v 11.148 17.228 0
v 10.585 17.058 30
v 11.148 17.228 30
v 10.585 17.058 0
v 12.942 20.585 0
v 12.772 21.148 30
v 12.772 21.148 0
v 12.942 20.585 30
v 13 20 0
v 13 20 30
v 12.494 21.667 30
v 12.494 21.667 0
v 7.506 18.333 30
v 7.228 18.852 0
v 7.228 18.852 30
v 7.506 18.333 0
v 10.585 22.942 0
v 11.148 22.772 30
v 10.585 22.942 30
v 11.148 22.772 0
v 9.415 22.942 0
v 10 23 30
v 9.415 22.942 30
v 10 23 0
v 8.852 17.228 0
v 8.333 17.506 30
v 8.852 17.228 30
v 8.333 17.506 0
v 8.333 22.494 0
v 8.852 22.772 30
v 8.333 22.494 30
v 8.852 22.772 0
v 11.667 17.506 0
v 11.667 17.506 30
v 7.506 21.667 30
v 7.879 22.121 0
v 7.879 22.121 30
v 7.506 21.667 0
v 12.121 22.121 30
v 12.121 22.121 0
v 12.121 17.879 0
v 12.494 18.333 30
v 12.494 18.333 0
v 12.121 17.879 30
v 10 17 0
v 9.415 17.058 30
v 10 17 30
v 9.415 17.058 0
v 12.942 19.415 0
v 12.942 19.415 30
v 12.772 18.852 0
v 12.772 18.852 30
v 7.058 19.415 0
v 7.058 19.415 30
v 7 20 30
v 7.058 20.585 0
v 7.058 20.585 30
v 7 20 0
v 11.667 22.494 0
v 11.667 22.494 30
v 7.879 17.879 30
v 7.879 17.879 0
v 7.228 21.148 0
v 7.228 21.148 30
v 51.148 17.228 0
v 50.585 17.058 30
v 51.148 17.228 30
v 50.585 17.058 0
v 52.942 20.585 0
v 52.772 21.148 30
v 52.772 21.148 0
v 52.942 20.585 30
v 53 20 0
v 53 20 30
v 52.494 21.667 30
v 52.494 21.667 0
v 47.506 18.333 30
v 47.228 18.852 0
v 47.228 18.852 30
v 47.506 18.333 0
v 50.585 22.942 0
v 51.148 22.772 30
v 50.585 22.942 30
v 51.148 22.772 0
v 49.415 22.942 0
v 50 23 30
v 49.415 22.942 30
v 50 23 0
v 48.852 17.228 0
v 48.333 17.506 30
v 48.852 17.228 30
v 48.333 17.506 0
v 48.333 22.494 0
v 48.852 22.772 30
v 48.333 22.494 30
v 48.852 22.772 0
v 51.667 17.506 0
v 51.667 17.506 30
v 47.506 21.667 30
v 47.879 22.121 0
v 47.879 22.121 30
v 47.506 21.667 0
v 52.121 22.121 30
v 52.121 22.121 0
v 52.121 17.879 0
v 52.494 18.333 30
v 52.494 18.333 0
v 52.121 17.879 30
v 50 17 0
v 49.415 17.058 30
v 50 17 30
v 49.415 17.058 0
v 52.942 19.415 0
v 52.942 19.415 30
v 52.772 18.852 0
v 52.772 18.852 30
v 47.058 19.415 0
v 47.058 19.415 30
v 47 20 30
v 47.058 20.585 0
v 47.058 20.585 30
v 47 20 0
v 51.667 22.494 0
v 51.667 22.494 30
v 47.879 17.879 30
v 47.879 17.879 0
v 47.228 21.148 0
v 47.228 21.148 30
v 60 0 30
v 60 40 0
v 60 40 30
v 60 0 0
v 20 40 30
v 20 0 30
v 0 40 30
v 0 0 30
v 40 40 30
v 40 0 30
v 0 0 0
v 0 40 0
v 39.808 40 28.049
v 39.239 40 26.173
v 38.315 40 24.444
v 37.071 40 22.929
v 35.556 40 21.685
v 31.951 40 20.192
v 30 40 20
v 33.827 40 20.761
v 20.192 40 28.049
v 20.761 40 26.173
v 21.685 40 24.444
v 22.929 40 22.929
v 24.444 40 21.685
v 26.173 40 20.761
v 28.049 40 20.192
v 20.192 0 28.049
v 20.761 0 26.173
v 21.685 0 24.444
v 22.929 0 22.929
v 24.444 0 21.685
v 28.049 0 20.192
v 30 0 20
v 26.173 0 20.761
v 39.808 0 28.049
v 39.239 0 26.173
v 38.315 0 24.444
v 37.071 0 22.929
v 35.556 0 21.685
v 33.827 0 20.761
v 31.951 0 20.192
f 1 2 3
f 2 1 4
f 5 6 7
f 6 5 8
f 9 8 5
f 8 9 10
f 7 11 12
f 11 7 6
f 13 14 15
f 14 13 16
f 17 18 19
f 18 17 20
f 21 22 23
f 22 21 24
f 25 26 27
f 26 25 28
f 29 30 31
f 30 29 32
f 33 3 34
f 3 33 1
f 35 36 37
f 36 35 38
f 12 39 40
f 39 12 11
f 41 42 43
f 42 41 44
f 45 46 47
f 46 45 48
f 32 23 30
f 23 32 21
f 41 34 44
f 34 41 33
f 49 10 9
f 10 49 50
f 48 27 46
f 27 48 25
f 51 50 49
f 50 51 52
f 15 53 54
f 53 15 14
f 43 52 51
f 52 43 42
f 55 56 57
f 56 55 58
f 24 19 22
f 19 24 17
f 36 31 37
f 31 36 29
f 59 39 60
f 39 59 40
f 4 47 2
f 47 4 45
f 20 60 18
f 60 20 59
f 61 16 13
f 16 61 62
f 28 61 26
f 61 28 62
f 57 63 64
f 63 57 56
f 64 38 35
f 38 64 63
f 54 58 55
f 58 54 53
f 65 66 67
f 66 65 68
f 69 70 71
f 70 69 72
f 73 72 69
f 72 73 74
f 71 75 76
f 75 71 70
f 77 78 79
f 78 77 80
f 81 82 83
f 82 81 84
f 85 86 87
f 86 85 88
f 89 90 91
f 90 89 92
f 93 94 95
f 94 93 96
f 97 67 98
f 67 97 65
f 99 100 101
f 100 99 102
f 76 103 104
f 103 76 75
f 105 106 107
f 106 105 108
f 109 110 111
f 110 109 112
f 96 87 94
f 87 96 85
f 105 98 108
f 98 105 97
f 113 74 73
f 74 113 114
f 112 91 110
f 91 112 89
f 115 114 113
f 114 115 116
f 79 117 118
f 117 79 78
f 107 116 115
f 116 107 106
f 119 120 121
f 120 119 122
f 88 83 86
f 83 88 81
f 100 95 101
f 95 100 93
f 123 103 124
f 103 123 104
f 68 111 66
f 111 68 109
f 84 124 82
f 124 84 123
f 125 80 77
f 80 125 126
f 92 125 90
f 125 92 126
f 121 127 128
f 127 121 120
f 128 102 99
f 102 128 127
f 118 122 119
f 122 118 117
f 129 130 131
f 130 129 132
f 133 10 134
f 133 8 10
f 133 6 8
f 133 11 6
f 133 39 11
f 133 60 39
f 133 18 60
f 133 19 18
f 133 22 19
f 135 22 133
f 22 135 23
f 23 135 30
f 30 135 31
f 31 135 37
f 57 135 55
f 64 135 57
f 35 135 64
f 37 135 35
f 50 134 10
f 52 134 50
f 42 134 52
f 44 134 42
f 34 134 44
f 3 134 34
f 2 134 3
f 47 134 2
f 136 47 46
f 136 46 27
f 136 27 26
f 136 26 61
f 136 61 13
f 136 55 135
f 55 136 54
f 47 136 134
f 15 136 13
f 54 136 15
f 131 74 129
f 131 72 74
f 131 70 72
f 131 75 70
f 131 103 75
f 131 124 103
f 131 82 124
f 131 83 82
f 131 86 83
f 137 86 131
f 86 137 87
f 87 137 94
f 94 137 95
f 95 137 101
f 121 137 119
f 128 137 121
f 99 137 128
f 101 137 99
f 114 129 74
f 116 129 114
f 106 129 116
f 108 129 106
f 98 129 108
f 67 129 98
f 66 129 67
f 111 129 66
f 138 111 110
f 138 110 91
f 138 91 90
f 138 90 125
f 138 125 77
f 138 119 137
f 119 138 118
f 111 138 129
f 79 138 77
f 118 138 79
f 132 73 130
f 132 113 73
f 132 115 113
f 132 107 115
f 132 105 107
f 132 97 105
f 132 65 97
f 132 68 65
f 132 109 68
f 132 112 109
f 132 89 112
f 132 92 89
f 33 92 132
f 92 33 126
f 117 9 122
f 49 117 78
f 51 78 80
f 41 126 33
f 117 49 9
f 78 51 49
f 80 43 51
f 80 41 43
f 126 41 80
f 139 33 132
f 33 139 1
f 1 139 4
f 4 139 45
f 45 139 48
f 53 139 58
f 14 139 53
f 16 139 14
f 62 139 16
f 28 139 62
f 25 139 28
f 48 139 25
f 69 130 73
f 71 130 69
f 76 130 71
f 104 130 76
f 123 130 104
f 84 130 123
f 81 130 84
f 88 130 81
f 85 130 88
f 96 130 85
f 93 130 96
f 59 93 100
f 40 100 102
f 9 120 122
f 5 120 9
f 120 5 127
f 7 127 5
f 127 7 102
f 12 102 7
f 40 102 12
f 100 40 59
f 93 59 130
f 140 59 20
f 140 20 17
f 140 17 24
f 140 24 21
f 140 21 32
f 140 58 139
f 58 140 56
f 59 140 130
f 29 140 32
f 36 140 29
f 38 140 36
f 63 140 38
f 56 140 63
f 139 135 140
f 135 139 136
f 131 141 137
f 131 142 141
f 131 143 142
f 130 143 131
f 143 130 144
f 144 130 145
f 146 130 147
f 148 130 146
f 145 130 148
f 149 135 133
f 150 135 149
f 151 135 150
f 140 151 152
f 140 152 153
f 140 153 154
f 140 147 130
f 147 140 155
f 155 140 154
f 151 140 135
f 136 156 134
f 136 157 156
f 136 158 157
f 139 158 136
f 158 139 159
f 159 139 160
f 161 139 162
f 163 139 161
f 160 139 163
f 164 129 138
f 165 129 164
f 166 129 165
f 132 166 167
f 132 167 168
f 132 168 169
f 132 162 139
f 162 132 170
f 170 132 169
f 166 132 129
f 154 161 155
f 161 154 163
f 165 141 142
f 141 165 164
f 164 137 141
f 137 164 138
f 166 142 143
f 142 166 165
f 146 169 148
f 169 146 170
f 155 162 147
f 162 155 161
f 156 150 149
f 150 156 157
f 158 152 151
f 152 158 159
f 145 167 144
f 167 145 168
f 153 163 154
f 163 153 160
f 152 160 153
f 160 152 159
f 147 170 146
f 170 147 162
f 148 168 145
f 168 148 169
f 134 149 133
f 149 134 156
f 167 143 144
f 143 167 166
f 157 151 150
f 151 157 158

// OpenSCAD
$fn = 32;

// ----------------------------------------------------------------------
// Saddle clamp: plain shaft clamp
// ----------------------------------------------------------------------

// --- parameters (mm) ---
blk_l = 60;               // block length, X
blk_w = 40;               // block width, Y
blk_h = 30;               // block height
clamp_r = 10;             // shaft groove radius
hole_r = 3;               // bolt hole radius
hole_m = 10;              // bolt hole margin from the ends

saw_depth = clamp_r + 3;  // saw kerf depth

difference() {
  cube([blk_l, blk_w, blk_h]);
  translate([blk_l / 2, -1, blk_h])
    rotate([-90, 0, 0])
      cylinder(h = blk_w + 2, r = clamp_r);
  for (sx = [0, 1])
    translate([sx ? blk_l - hole_m : hole_m, blk_w / 2, -1])
      cylinder(r = hole_r, h = blk_h + 2);
}
